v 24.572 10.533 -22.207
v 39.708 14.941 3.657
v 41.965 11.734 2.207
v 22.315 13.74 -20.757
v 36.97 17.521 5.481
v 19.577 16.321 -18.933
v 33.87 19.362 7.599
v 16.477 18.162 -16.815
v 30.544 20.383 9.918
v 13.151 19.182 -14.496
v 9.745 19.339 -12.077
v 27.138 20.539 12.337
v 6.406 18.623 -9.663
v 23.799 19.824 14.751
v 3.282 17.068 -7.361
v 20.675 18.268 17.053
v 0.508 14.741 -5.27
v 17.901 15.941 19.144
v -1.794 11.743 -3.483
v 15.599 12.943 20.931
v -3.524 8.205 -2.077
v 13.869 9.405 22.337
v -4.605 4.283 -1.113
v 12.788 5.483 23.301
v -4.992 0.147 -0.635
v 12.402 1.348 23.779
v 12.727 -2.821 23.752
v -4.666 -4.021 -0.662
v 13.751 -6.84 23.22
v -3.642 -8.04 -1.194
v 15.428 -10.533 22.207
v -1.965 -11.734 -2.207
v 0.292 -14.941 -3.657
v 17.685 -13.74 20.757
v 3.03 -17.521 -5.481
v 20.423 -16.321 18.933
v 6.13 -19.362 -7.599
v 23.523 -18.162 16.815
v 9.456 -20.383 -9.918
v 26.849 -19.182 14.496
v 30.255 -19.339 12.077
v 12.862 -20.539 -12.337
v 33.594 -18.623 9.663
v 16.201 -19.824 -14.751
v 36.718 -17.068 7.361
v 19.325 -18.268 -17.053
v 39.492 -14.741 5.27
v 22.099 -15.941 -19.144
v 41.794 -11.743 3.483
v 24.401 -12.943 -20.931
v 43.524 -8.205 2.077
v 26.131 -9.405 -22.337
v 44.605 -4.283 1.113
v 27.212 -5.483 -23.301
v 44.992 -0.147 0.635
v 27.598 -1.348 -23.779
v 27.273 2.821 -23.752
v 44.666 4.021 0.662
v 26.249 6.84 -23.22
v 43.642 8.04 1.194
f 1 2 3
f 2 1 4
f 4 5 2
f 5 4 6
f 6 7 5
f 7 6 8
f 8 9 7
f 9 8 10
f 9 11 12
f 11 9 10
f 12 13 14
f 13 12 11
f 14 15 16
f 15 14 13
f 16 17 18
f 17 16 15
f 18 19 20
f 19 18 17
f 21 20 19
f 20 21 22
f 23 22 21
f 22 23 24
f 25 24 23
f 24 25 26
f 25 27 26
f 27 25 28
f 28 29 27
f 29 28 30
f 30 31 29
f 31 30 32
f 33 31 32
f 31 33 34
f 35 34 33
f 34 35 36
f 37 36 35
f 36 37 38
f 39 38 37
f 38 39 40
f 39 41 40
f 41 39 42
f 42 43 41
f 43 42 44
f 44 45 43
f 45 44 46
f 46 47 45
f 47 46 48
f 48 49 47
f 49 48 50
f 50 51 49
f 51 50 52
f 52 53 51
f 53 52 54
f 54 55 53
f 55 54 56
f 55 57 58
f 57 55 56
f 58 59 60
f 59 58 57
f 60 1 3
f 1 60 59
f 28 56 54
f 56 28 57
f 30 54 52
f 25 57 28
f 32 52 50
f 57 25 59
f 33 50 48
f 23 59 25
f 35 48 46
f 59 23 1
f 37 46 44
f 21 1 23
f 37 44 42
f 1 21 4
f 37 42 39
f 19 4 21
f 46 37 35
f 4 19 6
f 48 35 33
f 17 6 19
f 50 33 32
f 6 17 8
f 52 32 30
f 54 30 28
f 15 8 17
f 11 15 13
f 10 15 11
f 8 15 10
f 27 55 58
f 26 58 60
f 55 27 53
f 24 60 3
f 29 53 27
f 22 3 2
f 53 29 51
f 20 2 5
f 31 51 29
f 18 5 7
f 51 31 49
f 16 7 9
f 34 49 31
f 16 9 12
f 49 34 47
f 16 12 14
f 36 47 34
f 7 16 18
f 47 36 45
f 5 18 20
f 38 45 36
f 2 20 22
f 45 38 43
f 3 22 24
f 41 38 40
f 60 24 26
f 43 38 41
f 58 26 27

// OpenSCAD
/*rotation*/

translate([20,0,0])
rotate([20,30,40]) 
cylinder(r=20,h=30, center= true);
